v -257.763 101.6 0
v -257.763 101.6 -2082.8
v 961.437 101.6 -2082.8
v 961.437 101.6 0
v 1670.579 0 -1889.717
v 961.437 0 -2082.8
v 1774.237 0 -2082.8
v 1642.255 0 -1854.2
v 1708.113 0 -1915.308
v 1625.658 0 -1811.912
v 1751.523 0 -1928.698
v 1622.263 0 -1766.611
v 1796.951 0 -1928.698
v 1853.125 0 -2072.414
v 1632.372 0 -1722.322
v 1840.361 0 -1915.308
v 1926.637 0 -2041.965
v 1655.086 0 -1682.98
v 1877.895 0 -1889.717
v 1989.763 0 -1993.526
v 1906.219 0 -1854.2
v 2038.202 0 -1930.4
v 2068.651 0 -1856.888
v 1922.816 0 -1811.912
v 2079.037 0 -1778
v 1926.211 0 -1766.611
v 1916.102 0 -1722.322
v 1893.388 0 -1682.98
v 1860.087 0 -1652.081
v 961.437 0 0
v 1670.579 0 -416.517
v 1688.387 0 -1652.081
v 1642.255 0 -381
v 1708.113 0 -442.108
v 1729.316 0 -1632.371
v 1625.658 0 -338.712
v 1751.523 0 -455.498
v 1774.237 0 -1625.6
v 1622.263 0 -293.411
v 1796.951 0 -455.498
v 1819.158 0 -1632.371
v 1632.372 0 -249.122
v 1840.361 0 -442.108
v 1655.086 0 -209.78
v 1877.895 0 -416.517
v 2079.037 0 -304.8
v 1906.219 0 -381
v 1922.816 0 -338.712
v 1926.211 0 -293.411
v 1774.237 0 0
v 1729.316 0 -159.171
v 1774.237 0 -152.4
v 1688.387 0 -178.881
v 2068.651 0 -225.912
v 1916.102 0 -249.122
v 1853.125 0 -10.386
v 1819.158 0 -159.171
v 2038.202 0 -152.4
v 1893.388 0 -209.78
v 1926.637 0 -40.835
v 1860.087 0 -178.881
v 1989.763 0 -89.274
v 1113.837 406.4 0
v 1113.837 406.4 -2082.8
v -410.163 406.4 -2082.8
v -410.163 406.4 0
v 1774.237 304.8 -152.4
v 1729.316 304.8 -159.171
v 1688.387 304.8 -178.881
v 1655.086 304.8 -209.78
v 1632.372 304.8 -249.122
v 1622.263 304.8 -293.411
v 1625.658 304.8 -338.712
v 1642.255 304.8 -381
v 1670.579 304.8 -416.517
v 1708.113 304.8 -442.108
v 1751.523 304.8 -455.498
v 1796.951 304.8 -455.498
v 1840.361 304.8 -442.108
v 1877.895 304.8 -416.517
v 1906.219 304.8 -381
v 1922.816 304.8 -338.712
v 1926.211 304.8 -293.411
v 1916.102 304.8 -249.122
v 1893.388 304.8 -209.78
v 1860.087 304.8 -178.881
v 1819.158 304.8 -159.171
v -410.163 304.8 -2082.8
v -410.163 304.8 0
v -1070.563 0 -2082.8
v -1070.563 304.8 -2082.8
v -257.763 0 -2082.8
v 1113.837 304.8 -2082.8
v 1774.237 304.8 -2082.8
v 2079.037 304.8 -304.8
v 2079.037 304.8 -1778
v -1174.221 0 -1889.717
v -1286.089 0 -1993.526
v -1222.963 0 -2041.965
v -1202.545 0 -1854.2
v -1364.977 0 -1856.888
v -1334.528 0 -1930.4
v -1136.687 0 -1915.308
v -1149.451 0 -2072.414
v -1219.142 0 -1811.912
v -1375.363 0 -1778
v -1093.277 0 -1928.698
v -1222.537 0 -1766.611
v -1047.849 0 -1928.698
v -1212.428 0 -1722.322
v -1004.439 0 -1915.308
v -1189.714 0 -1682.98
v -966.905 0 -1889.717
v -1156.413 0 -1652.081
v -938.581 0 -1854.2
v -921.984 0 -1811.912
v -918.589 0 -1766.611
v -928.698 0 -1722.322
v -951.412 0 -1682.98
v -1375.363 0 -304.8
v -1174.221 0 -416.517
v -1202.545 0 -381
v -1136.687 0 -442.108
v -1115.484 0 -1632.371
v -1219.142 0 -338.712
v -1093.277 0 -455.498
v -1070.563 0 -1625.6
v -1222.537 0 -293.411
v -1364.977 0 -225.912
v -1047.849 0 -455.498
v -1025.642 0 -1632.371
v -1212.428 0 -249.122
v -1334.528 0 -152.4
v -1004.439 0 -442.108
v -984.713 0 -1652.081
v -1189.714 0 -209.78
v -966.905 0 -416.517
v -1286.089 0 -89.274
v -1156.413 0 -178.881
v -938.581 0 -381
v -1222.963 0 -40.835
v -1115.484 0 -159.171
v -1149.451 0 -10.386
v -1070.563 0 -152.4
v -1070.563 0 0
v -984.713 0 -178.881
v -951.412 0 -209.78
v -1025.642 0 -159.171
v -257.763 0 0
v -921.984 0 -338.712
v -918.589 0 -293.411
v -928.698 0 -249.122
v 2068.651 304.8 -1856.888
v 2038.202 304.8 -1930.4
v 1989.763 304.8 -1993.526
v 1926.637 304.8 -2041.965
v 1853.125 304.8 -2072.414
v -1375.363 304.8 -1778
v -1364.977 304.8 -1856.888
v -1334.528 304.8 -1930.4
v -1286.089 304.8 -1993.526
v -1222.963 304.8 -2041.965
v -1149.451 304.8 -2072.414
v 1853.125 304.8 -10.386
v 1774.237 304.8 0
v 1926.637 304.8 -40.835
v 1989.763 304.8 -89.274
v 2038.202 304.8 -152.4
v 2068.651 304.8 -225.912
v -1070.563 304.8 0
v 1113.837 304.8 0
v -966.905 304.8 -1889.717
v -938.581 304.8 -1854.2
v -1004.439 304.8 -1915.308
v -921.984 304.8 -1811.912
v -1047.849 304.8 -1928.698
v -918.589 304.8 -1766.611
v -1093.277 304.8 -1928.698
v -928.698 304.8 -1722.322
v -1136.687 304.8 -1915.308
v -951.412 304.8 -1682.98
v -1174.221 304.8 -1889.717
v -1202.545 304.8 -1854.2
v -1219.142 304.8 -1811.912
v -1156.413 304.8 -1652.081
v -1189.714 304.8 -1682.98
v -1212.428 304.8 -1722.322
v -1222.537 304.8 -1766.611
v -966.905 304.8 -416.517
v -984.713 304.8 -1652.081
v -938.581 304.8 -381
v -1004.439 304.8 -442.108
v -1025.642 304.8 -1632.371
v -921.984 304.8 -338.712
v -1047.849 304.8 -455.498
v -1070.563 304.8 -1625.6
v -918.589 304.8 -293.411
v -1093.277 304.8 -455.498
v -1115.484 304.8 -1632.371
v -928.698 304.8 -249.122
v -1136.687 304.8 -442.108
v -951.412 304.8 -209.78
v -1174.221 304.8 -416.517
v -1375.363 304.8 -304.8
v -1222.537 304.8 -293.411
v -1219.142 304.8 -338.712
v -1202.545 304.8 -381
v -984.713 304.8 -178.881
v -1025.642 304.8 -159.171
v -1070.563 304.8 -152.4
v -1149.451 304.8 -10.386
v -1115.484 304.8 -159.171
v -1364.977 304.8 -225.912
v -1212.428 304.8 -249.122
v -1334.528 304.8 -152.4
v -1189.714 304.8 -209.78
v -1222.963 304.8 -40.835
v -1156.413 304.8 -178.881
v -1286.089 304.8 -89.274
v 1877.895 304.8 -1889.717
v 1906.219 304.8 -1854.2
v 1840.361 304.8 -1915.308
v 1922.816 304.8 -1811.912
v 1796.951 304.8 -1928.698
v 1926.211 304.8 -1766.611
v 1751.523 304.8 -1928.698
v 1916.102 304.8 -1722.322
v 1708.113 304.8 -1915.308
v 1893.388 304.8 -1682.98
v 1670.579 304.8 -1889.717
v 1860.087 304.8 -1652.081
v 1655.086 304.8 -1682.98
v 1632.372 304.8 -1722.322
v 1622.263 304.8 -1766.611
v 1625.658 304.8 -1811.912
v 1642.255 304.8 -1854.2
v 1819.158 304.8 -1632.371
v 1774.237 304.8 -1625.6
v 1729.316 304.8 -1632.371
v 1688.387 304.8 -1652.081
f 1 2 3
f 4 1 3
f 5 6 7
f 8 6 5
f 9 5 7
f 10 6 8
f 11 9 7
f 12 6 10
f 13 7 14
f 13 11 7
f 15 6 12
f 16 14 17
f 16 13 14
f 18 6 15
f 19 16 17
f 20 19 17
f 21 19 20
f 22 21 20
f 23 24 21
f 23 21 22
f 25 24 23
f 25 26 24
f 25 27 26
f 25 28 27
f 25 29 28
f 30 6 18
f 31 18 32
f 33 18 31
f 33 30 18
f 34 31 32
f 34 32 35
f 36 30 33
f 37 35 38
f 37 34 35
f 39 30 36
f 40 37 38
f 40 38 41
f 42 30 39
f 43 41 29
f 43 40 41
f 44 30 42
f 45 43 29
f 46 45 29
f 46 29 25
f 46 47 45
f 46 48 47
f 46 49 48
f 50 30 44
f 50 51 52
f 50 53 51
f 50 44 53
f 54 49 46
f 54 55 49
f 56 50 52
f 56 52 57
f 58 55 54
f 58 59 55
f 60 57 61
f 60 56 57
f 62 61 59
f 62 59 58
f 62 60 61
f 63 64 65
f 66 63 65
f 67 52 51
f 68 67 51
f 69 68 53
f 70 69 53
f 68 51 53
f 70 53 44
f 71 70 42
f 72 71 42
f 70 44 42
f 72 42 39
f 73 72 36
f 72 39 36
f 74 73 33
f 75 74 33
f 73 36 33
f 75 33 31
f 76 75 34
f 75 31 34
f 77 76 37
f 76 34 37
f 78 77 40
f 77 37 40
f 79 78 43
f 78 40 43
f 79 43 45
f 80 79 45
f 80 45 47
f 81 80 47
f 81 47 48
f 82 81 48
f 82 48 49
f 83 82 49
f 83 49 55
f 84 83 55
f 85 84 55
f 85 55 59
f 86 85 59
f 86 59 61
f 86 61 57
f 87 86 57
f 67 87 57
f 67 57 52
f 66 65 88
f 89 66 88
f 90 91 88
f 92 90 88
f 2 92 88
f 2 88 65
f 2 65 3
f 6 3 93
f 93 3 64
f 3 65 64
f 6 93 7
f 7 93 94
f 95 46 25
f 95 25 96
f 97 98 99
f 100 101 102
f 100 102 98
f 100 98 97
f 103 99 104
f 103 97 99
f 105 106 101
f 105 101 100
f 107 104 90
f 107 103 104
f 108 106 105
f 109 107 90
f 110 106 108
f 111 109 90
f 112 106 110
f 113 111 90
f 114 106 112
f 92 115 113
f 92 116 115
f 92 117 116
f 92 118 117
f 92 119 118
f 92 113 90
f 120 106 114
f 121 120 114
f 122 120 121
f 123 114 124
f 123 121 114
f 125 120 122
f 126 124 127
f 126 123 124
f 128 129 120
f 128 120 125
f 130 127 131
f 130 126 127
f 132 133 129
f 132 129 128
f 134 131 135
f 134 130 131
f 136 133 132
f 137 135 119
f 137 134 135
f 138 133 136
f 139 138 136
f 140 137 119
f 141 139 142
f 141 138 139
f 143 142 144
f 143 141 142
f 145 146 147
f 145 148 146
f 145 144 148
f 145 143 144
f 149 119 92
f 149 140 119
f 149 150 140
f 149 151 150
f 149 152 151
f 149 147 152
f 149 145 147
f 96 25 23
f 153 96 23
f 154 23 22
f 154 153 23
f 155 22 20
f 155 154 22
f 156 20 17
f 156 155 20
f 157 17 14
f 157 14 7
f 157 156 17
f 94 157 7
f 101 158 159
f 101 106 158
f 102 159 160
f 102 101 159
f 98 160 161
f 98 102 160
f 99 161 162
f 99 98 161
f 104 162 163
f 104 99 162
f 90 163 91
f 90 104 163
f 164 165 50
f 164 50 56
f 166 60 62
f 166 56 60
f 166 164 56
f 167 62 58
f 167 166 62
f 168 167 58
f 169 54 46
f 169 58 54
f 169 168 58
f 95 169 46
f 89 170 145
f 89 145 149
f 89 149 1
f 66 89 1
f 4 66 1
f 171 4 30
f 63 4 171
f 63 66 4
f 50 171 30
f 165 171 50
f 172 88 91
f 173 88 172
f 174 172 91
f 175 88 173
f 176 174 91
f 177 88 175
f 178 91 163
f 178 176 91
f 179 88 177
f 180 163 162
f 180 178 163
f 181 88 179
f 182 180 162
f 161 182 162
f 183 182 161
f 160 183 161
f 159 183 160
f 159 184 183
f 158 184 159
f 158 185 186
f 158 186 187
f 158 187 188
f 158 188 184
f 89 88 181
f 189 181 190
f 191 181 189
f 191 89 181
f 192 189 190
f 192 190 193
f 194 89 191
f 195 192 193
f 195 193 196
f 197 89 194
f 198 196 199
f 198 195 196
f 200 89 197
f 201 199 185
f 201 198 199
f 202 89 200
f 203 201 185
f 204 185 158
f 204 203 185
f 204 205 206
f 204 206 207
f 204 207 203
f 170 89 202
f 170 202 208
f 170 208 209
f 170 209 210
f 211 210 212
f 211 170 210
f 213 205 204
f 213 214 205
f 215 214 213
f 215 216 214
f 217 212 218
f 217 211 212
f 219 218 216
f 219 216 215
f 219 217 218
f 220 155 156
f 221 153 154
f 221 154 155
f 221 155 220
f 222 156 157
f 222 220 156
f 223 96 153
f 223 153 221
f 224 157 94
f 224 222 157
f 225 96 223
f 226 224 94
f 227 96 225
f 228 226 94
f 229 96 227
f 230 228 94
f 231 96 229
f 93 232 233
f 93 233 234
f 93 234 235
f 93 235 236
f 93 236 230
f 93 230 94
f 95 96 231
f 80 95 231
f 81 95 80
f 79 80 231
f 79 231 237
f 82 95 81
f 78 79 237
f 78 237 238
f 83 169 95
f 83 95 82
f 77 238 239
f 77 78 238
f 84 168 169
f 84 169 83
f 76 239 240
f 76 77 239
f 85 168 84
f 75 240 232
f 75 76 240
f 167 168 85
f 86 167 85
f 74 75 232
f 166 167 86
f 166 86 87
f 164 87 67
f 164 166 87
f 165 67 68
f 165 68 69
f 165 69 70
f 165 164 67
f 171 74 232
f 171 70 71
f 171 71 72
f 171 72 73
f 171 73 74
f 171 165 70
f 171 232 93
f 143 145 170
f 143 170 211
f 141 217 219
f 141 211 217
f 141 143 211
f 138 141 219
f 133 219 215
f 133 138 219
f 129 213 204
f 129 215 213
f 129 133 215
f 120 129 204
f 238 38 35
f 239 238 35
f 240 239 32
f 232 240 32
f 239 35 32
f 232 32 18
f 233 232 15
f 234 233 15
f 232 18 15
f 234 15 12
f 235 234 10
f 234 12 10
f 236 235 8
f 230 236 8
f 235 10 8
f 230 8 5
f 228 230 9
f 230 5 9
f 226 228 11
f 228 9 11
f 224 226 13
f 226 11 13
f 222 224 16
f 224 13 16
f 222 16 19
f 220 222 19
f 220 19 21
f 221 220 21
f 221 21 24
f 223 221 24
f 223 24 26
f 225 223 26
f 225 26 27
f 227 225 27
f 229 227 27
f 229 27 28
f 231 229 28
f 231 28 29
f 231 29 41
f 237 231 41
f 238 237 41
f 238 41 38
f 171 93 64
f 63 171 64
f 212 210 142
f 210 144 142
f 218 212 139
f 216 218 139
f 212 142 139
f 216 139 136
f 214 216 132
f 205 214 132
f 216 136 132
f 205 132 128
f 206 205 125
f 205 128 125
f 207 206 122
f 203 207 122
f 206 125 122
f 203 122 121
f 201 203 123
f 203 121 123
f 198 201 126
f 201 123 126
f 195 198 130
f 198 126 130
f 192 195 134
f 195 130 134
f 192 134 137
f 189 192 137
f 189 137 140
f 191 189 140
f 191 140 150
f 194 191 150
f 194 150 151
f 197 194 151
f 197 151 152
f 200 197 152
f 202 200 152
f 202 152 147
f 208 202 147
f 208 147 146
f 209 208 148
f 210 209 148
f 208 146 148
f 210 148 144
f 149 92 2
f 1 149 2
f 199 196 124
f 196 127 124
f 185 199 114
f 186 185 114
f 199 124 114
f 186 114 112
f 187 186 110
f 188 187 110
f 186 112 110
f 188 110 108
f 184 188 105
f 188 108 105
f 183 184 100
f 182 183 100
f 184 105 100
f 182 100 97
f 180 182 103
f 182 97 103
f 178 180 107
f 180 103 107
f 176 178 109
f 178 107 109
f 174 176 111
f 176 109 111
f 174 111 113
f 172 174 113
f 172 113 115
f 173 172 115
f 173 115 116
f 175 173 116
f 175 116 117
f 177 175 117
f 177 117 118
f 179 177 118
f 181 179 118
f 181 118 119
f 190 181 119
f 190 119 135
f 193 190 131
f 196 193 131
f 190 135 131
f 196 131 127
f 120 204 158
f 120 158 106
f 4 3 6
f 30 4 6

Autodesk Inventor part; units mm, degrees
ref_plane "YZ Plane" through (0, 0, 0) normal (1, 0, 0) x (0, 1, 0)
ref_plane "XZ Plane" through (0, 0, 0) normal (0, 1, 0) x (-1, 0, 0)
ref_plane "XY Plane" through (0, 0, 0) normal (0, 0, 1) x (1, 0, 0)
sketch "Sketch1" plane through (0, 0, 0) normal (0, 0, 1) x (1, 0, 0)
  line L0 (-1375.363, 0) -> (-257.763, 0)
  line L1 (-257.763, 0) -> (-257.763, 101.6)
  line L2 (-257.763, 101.6) -> (961.437, 101.6)
  line L3 (961.437, 101.6) -> (961.437, 0)
  line L4 (961.437, 0) -> (2079.037, 0)
  line L5 (2079.037, 0) -> (2079.037, 304.8)
  line L6 (2079.037, 304.8) -> (1113.837, 304.8)
  line L7 (1113.837, 304.8) -> (1113.837, 406.4)
  line L8 (1113.837, 406.4) -> (-410.163, 406.4)
  line L9 (-410.163, 406.4) -> (-410.163, 304.8)
  line L10 (-410.163, 304.8) -> (-1375.363, 304.8)
  line L11 (-1375.363, 304.8) -> (-1375.363, 0)
  point P0 (0, 0)
  dimension "d0" = 1117.6
  dimension "d1" = 101.6
  dimension "d2" = 1219.2
  dimension "d3" = 1117.6
  dimension "d4" = 304.8
  dimension "d5" = 965.2
  dimension "d6" = 1524
  dimension "d7" = 101.6
extrude "Extrusion1" add sketch "Sketch1" against normal blind 2082.8
fillet "Fillet1" radius 304.8 4 edges at (-1375.363, 152.4, 0) (2079.037, 152.4, 0) (2079.037, 152.4, -2082.8) (-1375.363, 152.4, -2082.8)
sketch "Sketch2" plane through (-410.163, 304.8, 0) normal (0, 1, 0) x (1, 0, 0)
  arc A0 (-660.4, 2082.8) -> (-965.2, 1778) centre (-660.4, 1778) ccw projected
  circle A1 centre (-660.4, 1778) radius 152.4
  arc A2 (-965.2, 304.8) -> (-660.4, 0) centre (-660.4, 304.8) ccw projected
  circle A3 centre (-660.4, 304.8) radius 152.4
  arc A4 (2489.2, 1778) -> (2184.4, 2082.8) centre (2184.4, 1778) ccw projected
  circle A5 centre (2184.4, 1778) radius 152.4
  arc A6 (2184.4, 0) -> (2489.2, 304.8) centre (2184.4, 304.8) ccw projected
  circle A7 centre (2184.4, 304.8) radius 152.4
  point P0 (410.163, 0)
  dimension "d11" = 304.8
  dimension "d12" = 304.8
  dimension "d13" = 304.8
  dimension "d14" = 304.8
hole "Hole1" at (-1070.563, 304.8, -1778) direction (0, -1, 0) diameter 304.8 end through all
sketch "Sketch3" plane through (-410.163, 304.8, 0) normal (0, 1, 0) x (1, 0, 0)
  arc A0 (-965.2, 304.8) -> (-660.4, 0) centre (-660.4, 304.8) ccw projected
  circle A1 centre (-660.4, 304.8) radius 152.4
  point P0 (410.163, 0)
  dimension "d22" = 304.8
hole "Hole2" at (-1070.563, 304.8, -304.8) direction (0, -1, 0) diameter 304.8 end through all
sketch "Sketch4" plane through (1113.837, 304.8, 0) normal (0, 1, 0) x (1, 0, 0)
  arc A0 (965.2, 1778) -> (660.4, 2082.8) centre (660.4, 1778) ccw projected
  circle A1 centre (660.4, 1778) radius 152.4
  point P0 (-1113.837, 0)
  dimension "d30" = 304.8
hole "Hole3" at (1774.237, 304.8, -1778) direction (0, -1, 0) diameter 304.8 end through all
sketch "Sketch5" plane through (1113.837, 304.8, 0) normal (0, 1, 0) x (1, 0, 0)
  arc A0 (660.4, 0) -> (965.2, 304.8) centre (660.4, 304.8) ccw projected
  circle A1 centre (660.4, 304.8) radius 152.4
  point P0 (-1113.837, 0)
  dimension "d38" = 304.8
hole "Hole4" at (1774.237, 304.8, -304.8) direction (0, -1, 0) diameter 304.8 end through all
thread "Thread1" size "M310x6" class "6H" standard "ANSI Metric M Profile" full length
